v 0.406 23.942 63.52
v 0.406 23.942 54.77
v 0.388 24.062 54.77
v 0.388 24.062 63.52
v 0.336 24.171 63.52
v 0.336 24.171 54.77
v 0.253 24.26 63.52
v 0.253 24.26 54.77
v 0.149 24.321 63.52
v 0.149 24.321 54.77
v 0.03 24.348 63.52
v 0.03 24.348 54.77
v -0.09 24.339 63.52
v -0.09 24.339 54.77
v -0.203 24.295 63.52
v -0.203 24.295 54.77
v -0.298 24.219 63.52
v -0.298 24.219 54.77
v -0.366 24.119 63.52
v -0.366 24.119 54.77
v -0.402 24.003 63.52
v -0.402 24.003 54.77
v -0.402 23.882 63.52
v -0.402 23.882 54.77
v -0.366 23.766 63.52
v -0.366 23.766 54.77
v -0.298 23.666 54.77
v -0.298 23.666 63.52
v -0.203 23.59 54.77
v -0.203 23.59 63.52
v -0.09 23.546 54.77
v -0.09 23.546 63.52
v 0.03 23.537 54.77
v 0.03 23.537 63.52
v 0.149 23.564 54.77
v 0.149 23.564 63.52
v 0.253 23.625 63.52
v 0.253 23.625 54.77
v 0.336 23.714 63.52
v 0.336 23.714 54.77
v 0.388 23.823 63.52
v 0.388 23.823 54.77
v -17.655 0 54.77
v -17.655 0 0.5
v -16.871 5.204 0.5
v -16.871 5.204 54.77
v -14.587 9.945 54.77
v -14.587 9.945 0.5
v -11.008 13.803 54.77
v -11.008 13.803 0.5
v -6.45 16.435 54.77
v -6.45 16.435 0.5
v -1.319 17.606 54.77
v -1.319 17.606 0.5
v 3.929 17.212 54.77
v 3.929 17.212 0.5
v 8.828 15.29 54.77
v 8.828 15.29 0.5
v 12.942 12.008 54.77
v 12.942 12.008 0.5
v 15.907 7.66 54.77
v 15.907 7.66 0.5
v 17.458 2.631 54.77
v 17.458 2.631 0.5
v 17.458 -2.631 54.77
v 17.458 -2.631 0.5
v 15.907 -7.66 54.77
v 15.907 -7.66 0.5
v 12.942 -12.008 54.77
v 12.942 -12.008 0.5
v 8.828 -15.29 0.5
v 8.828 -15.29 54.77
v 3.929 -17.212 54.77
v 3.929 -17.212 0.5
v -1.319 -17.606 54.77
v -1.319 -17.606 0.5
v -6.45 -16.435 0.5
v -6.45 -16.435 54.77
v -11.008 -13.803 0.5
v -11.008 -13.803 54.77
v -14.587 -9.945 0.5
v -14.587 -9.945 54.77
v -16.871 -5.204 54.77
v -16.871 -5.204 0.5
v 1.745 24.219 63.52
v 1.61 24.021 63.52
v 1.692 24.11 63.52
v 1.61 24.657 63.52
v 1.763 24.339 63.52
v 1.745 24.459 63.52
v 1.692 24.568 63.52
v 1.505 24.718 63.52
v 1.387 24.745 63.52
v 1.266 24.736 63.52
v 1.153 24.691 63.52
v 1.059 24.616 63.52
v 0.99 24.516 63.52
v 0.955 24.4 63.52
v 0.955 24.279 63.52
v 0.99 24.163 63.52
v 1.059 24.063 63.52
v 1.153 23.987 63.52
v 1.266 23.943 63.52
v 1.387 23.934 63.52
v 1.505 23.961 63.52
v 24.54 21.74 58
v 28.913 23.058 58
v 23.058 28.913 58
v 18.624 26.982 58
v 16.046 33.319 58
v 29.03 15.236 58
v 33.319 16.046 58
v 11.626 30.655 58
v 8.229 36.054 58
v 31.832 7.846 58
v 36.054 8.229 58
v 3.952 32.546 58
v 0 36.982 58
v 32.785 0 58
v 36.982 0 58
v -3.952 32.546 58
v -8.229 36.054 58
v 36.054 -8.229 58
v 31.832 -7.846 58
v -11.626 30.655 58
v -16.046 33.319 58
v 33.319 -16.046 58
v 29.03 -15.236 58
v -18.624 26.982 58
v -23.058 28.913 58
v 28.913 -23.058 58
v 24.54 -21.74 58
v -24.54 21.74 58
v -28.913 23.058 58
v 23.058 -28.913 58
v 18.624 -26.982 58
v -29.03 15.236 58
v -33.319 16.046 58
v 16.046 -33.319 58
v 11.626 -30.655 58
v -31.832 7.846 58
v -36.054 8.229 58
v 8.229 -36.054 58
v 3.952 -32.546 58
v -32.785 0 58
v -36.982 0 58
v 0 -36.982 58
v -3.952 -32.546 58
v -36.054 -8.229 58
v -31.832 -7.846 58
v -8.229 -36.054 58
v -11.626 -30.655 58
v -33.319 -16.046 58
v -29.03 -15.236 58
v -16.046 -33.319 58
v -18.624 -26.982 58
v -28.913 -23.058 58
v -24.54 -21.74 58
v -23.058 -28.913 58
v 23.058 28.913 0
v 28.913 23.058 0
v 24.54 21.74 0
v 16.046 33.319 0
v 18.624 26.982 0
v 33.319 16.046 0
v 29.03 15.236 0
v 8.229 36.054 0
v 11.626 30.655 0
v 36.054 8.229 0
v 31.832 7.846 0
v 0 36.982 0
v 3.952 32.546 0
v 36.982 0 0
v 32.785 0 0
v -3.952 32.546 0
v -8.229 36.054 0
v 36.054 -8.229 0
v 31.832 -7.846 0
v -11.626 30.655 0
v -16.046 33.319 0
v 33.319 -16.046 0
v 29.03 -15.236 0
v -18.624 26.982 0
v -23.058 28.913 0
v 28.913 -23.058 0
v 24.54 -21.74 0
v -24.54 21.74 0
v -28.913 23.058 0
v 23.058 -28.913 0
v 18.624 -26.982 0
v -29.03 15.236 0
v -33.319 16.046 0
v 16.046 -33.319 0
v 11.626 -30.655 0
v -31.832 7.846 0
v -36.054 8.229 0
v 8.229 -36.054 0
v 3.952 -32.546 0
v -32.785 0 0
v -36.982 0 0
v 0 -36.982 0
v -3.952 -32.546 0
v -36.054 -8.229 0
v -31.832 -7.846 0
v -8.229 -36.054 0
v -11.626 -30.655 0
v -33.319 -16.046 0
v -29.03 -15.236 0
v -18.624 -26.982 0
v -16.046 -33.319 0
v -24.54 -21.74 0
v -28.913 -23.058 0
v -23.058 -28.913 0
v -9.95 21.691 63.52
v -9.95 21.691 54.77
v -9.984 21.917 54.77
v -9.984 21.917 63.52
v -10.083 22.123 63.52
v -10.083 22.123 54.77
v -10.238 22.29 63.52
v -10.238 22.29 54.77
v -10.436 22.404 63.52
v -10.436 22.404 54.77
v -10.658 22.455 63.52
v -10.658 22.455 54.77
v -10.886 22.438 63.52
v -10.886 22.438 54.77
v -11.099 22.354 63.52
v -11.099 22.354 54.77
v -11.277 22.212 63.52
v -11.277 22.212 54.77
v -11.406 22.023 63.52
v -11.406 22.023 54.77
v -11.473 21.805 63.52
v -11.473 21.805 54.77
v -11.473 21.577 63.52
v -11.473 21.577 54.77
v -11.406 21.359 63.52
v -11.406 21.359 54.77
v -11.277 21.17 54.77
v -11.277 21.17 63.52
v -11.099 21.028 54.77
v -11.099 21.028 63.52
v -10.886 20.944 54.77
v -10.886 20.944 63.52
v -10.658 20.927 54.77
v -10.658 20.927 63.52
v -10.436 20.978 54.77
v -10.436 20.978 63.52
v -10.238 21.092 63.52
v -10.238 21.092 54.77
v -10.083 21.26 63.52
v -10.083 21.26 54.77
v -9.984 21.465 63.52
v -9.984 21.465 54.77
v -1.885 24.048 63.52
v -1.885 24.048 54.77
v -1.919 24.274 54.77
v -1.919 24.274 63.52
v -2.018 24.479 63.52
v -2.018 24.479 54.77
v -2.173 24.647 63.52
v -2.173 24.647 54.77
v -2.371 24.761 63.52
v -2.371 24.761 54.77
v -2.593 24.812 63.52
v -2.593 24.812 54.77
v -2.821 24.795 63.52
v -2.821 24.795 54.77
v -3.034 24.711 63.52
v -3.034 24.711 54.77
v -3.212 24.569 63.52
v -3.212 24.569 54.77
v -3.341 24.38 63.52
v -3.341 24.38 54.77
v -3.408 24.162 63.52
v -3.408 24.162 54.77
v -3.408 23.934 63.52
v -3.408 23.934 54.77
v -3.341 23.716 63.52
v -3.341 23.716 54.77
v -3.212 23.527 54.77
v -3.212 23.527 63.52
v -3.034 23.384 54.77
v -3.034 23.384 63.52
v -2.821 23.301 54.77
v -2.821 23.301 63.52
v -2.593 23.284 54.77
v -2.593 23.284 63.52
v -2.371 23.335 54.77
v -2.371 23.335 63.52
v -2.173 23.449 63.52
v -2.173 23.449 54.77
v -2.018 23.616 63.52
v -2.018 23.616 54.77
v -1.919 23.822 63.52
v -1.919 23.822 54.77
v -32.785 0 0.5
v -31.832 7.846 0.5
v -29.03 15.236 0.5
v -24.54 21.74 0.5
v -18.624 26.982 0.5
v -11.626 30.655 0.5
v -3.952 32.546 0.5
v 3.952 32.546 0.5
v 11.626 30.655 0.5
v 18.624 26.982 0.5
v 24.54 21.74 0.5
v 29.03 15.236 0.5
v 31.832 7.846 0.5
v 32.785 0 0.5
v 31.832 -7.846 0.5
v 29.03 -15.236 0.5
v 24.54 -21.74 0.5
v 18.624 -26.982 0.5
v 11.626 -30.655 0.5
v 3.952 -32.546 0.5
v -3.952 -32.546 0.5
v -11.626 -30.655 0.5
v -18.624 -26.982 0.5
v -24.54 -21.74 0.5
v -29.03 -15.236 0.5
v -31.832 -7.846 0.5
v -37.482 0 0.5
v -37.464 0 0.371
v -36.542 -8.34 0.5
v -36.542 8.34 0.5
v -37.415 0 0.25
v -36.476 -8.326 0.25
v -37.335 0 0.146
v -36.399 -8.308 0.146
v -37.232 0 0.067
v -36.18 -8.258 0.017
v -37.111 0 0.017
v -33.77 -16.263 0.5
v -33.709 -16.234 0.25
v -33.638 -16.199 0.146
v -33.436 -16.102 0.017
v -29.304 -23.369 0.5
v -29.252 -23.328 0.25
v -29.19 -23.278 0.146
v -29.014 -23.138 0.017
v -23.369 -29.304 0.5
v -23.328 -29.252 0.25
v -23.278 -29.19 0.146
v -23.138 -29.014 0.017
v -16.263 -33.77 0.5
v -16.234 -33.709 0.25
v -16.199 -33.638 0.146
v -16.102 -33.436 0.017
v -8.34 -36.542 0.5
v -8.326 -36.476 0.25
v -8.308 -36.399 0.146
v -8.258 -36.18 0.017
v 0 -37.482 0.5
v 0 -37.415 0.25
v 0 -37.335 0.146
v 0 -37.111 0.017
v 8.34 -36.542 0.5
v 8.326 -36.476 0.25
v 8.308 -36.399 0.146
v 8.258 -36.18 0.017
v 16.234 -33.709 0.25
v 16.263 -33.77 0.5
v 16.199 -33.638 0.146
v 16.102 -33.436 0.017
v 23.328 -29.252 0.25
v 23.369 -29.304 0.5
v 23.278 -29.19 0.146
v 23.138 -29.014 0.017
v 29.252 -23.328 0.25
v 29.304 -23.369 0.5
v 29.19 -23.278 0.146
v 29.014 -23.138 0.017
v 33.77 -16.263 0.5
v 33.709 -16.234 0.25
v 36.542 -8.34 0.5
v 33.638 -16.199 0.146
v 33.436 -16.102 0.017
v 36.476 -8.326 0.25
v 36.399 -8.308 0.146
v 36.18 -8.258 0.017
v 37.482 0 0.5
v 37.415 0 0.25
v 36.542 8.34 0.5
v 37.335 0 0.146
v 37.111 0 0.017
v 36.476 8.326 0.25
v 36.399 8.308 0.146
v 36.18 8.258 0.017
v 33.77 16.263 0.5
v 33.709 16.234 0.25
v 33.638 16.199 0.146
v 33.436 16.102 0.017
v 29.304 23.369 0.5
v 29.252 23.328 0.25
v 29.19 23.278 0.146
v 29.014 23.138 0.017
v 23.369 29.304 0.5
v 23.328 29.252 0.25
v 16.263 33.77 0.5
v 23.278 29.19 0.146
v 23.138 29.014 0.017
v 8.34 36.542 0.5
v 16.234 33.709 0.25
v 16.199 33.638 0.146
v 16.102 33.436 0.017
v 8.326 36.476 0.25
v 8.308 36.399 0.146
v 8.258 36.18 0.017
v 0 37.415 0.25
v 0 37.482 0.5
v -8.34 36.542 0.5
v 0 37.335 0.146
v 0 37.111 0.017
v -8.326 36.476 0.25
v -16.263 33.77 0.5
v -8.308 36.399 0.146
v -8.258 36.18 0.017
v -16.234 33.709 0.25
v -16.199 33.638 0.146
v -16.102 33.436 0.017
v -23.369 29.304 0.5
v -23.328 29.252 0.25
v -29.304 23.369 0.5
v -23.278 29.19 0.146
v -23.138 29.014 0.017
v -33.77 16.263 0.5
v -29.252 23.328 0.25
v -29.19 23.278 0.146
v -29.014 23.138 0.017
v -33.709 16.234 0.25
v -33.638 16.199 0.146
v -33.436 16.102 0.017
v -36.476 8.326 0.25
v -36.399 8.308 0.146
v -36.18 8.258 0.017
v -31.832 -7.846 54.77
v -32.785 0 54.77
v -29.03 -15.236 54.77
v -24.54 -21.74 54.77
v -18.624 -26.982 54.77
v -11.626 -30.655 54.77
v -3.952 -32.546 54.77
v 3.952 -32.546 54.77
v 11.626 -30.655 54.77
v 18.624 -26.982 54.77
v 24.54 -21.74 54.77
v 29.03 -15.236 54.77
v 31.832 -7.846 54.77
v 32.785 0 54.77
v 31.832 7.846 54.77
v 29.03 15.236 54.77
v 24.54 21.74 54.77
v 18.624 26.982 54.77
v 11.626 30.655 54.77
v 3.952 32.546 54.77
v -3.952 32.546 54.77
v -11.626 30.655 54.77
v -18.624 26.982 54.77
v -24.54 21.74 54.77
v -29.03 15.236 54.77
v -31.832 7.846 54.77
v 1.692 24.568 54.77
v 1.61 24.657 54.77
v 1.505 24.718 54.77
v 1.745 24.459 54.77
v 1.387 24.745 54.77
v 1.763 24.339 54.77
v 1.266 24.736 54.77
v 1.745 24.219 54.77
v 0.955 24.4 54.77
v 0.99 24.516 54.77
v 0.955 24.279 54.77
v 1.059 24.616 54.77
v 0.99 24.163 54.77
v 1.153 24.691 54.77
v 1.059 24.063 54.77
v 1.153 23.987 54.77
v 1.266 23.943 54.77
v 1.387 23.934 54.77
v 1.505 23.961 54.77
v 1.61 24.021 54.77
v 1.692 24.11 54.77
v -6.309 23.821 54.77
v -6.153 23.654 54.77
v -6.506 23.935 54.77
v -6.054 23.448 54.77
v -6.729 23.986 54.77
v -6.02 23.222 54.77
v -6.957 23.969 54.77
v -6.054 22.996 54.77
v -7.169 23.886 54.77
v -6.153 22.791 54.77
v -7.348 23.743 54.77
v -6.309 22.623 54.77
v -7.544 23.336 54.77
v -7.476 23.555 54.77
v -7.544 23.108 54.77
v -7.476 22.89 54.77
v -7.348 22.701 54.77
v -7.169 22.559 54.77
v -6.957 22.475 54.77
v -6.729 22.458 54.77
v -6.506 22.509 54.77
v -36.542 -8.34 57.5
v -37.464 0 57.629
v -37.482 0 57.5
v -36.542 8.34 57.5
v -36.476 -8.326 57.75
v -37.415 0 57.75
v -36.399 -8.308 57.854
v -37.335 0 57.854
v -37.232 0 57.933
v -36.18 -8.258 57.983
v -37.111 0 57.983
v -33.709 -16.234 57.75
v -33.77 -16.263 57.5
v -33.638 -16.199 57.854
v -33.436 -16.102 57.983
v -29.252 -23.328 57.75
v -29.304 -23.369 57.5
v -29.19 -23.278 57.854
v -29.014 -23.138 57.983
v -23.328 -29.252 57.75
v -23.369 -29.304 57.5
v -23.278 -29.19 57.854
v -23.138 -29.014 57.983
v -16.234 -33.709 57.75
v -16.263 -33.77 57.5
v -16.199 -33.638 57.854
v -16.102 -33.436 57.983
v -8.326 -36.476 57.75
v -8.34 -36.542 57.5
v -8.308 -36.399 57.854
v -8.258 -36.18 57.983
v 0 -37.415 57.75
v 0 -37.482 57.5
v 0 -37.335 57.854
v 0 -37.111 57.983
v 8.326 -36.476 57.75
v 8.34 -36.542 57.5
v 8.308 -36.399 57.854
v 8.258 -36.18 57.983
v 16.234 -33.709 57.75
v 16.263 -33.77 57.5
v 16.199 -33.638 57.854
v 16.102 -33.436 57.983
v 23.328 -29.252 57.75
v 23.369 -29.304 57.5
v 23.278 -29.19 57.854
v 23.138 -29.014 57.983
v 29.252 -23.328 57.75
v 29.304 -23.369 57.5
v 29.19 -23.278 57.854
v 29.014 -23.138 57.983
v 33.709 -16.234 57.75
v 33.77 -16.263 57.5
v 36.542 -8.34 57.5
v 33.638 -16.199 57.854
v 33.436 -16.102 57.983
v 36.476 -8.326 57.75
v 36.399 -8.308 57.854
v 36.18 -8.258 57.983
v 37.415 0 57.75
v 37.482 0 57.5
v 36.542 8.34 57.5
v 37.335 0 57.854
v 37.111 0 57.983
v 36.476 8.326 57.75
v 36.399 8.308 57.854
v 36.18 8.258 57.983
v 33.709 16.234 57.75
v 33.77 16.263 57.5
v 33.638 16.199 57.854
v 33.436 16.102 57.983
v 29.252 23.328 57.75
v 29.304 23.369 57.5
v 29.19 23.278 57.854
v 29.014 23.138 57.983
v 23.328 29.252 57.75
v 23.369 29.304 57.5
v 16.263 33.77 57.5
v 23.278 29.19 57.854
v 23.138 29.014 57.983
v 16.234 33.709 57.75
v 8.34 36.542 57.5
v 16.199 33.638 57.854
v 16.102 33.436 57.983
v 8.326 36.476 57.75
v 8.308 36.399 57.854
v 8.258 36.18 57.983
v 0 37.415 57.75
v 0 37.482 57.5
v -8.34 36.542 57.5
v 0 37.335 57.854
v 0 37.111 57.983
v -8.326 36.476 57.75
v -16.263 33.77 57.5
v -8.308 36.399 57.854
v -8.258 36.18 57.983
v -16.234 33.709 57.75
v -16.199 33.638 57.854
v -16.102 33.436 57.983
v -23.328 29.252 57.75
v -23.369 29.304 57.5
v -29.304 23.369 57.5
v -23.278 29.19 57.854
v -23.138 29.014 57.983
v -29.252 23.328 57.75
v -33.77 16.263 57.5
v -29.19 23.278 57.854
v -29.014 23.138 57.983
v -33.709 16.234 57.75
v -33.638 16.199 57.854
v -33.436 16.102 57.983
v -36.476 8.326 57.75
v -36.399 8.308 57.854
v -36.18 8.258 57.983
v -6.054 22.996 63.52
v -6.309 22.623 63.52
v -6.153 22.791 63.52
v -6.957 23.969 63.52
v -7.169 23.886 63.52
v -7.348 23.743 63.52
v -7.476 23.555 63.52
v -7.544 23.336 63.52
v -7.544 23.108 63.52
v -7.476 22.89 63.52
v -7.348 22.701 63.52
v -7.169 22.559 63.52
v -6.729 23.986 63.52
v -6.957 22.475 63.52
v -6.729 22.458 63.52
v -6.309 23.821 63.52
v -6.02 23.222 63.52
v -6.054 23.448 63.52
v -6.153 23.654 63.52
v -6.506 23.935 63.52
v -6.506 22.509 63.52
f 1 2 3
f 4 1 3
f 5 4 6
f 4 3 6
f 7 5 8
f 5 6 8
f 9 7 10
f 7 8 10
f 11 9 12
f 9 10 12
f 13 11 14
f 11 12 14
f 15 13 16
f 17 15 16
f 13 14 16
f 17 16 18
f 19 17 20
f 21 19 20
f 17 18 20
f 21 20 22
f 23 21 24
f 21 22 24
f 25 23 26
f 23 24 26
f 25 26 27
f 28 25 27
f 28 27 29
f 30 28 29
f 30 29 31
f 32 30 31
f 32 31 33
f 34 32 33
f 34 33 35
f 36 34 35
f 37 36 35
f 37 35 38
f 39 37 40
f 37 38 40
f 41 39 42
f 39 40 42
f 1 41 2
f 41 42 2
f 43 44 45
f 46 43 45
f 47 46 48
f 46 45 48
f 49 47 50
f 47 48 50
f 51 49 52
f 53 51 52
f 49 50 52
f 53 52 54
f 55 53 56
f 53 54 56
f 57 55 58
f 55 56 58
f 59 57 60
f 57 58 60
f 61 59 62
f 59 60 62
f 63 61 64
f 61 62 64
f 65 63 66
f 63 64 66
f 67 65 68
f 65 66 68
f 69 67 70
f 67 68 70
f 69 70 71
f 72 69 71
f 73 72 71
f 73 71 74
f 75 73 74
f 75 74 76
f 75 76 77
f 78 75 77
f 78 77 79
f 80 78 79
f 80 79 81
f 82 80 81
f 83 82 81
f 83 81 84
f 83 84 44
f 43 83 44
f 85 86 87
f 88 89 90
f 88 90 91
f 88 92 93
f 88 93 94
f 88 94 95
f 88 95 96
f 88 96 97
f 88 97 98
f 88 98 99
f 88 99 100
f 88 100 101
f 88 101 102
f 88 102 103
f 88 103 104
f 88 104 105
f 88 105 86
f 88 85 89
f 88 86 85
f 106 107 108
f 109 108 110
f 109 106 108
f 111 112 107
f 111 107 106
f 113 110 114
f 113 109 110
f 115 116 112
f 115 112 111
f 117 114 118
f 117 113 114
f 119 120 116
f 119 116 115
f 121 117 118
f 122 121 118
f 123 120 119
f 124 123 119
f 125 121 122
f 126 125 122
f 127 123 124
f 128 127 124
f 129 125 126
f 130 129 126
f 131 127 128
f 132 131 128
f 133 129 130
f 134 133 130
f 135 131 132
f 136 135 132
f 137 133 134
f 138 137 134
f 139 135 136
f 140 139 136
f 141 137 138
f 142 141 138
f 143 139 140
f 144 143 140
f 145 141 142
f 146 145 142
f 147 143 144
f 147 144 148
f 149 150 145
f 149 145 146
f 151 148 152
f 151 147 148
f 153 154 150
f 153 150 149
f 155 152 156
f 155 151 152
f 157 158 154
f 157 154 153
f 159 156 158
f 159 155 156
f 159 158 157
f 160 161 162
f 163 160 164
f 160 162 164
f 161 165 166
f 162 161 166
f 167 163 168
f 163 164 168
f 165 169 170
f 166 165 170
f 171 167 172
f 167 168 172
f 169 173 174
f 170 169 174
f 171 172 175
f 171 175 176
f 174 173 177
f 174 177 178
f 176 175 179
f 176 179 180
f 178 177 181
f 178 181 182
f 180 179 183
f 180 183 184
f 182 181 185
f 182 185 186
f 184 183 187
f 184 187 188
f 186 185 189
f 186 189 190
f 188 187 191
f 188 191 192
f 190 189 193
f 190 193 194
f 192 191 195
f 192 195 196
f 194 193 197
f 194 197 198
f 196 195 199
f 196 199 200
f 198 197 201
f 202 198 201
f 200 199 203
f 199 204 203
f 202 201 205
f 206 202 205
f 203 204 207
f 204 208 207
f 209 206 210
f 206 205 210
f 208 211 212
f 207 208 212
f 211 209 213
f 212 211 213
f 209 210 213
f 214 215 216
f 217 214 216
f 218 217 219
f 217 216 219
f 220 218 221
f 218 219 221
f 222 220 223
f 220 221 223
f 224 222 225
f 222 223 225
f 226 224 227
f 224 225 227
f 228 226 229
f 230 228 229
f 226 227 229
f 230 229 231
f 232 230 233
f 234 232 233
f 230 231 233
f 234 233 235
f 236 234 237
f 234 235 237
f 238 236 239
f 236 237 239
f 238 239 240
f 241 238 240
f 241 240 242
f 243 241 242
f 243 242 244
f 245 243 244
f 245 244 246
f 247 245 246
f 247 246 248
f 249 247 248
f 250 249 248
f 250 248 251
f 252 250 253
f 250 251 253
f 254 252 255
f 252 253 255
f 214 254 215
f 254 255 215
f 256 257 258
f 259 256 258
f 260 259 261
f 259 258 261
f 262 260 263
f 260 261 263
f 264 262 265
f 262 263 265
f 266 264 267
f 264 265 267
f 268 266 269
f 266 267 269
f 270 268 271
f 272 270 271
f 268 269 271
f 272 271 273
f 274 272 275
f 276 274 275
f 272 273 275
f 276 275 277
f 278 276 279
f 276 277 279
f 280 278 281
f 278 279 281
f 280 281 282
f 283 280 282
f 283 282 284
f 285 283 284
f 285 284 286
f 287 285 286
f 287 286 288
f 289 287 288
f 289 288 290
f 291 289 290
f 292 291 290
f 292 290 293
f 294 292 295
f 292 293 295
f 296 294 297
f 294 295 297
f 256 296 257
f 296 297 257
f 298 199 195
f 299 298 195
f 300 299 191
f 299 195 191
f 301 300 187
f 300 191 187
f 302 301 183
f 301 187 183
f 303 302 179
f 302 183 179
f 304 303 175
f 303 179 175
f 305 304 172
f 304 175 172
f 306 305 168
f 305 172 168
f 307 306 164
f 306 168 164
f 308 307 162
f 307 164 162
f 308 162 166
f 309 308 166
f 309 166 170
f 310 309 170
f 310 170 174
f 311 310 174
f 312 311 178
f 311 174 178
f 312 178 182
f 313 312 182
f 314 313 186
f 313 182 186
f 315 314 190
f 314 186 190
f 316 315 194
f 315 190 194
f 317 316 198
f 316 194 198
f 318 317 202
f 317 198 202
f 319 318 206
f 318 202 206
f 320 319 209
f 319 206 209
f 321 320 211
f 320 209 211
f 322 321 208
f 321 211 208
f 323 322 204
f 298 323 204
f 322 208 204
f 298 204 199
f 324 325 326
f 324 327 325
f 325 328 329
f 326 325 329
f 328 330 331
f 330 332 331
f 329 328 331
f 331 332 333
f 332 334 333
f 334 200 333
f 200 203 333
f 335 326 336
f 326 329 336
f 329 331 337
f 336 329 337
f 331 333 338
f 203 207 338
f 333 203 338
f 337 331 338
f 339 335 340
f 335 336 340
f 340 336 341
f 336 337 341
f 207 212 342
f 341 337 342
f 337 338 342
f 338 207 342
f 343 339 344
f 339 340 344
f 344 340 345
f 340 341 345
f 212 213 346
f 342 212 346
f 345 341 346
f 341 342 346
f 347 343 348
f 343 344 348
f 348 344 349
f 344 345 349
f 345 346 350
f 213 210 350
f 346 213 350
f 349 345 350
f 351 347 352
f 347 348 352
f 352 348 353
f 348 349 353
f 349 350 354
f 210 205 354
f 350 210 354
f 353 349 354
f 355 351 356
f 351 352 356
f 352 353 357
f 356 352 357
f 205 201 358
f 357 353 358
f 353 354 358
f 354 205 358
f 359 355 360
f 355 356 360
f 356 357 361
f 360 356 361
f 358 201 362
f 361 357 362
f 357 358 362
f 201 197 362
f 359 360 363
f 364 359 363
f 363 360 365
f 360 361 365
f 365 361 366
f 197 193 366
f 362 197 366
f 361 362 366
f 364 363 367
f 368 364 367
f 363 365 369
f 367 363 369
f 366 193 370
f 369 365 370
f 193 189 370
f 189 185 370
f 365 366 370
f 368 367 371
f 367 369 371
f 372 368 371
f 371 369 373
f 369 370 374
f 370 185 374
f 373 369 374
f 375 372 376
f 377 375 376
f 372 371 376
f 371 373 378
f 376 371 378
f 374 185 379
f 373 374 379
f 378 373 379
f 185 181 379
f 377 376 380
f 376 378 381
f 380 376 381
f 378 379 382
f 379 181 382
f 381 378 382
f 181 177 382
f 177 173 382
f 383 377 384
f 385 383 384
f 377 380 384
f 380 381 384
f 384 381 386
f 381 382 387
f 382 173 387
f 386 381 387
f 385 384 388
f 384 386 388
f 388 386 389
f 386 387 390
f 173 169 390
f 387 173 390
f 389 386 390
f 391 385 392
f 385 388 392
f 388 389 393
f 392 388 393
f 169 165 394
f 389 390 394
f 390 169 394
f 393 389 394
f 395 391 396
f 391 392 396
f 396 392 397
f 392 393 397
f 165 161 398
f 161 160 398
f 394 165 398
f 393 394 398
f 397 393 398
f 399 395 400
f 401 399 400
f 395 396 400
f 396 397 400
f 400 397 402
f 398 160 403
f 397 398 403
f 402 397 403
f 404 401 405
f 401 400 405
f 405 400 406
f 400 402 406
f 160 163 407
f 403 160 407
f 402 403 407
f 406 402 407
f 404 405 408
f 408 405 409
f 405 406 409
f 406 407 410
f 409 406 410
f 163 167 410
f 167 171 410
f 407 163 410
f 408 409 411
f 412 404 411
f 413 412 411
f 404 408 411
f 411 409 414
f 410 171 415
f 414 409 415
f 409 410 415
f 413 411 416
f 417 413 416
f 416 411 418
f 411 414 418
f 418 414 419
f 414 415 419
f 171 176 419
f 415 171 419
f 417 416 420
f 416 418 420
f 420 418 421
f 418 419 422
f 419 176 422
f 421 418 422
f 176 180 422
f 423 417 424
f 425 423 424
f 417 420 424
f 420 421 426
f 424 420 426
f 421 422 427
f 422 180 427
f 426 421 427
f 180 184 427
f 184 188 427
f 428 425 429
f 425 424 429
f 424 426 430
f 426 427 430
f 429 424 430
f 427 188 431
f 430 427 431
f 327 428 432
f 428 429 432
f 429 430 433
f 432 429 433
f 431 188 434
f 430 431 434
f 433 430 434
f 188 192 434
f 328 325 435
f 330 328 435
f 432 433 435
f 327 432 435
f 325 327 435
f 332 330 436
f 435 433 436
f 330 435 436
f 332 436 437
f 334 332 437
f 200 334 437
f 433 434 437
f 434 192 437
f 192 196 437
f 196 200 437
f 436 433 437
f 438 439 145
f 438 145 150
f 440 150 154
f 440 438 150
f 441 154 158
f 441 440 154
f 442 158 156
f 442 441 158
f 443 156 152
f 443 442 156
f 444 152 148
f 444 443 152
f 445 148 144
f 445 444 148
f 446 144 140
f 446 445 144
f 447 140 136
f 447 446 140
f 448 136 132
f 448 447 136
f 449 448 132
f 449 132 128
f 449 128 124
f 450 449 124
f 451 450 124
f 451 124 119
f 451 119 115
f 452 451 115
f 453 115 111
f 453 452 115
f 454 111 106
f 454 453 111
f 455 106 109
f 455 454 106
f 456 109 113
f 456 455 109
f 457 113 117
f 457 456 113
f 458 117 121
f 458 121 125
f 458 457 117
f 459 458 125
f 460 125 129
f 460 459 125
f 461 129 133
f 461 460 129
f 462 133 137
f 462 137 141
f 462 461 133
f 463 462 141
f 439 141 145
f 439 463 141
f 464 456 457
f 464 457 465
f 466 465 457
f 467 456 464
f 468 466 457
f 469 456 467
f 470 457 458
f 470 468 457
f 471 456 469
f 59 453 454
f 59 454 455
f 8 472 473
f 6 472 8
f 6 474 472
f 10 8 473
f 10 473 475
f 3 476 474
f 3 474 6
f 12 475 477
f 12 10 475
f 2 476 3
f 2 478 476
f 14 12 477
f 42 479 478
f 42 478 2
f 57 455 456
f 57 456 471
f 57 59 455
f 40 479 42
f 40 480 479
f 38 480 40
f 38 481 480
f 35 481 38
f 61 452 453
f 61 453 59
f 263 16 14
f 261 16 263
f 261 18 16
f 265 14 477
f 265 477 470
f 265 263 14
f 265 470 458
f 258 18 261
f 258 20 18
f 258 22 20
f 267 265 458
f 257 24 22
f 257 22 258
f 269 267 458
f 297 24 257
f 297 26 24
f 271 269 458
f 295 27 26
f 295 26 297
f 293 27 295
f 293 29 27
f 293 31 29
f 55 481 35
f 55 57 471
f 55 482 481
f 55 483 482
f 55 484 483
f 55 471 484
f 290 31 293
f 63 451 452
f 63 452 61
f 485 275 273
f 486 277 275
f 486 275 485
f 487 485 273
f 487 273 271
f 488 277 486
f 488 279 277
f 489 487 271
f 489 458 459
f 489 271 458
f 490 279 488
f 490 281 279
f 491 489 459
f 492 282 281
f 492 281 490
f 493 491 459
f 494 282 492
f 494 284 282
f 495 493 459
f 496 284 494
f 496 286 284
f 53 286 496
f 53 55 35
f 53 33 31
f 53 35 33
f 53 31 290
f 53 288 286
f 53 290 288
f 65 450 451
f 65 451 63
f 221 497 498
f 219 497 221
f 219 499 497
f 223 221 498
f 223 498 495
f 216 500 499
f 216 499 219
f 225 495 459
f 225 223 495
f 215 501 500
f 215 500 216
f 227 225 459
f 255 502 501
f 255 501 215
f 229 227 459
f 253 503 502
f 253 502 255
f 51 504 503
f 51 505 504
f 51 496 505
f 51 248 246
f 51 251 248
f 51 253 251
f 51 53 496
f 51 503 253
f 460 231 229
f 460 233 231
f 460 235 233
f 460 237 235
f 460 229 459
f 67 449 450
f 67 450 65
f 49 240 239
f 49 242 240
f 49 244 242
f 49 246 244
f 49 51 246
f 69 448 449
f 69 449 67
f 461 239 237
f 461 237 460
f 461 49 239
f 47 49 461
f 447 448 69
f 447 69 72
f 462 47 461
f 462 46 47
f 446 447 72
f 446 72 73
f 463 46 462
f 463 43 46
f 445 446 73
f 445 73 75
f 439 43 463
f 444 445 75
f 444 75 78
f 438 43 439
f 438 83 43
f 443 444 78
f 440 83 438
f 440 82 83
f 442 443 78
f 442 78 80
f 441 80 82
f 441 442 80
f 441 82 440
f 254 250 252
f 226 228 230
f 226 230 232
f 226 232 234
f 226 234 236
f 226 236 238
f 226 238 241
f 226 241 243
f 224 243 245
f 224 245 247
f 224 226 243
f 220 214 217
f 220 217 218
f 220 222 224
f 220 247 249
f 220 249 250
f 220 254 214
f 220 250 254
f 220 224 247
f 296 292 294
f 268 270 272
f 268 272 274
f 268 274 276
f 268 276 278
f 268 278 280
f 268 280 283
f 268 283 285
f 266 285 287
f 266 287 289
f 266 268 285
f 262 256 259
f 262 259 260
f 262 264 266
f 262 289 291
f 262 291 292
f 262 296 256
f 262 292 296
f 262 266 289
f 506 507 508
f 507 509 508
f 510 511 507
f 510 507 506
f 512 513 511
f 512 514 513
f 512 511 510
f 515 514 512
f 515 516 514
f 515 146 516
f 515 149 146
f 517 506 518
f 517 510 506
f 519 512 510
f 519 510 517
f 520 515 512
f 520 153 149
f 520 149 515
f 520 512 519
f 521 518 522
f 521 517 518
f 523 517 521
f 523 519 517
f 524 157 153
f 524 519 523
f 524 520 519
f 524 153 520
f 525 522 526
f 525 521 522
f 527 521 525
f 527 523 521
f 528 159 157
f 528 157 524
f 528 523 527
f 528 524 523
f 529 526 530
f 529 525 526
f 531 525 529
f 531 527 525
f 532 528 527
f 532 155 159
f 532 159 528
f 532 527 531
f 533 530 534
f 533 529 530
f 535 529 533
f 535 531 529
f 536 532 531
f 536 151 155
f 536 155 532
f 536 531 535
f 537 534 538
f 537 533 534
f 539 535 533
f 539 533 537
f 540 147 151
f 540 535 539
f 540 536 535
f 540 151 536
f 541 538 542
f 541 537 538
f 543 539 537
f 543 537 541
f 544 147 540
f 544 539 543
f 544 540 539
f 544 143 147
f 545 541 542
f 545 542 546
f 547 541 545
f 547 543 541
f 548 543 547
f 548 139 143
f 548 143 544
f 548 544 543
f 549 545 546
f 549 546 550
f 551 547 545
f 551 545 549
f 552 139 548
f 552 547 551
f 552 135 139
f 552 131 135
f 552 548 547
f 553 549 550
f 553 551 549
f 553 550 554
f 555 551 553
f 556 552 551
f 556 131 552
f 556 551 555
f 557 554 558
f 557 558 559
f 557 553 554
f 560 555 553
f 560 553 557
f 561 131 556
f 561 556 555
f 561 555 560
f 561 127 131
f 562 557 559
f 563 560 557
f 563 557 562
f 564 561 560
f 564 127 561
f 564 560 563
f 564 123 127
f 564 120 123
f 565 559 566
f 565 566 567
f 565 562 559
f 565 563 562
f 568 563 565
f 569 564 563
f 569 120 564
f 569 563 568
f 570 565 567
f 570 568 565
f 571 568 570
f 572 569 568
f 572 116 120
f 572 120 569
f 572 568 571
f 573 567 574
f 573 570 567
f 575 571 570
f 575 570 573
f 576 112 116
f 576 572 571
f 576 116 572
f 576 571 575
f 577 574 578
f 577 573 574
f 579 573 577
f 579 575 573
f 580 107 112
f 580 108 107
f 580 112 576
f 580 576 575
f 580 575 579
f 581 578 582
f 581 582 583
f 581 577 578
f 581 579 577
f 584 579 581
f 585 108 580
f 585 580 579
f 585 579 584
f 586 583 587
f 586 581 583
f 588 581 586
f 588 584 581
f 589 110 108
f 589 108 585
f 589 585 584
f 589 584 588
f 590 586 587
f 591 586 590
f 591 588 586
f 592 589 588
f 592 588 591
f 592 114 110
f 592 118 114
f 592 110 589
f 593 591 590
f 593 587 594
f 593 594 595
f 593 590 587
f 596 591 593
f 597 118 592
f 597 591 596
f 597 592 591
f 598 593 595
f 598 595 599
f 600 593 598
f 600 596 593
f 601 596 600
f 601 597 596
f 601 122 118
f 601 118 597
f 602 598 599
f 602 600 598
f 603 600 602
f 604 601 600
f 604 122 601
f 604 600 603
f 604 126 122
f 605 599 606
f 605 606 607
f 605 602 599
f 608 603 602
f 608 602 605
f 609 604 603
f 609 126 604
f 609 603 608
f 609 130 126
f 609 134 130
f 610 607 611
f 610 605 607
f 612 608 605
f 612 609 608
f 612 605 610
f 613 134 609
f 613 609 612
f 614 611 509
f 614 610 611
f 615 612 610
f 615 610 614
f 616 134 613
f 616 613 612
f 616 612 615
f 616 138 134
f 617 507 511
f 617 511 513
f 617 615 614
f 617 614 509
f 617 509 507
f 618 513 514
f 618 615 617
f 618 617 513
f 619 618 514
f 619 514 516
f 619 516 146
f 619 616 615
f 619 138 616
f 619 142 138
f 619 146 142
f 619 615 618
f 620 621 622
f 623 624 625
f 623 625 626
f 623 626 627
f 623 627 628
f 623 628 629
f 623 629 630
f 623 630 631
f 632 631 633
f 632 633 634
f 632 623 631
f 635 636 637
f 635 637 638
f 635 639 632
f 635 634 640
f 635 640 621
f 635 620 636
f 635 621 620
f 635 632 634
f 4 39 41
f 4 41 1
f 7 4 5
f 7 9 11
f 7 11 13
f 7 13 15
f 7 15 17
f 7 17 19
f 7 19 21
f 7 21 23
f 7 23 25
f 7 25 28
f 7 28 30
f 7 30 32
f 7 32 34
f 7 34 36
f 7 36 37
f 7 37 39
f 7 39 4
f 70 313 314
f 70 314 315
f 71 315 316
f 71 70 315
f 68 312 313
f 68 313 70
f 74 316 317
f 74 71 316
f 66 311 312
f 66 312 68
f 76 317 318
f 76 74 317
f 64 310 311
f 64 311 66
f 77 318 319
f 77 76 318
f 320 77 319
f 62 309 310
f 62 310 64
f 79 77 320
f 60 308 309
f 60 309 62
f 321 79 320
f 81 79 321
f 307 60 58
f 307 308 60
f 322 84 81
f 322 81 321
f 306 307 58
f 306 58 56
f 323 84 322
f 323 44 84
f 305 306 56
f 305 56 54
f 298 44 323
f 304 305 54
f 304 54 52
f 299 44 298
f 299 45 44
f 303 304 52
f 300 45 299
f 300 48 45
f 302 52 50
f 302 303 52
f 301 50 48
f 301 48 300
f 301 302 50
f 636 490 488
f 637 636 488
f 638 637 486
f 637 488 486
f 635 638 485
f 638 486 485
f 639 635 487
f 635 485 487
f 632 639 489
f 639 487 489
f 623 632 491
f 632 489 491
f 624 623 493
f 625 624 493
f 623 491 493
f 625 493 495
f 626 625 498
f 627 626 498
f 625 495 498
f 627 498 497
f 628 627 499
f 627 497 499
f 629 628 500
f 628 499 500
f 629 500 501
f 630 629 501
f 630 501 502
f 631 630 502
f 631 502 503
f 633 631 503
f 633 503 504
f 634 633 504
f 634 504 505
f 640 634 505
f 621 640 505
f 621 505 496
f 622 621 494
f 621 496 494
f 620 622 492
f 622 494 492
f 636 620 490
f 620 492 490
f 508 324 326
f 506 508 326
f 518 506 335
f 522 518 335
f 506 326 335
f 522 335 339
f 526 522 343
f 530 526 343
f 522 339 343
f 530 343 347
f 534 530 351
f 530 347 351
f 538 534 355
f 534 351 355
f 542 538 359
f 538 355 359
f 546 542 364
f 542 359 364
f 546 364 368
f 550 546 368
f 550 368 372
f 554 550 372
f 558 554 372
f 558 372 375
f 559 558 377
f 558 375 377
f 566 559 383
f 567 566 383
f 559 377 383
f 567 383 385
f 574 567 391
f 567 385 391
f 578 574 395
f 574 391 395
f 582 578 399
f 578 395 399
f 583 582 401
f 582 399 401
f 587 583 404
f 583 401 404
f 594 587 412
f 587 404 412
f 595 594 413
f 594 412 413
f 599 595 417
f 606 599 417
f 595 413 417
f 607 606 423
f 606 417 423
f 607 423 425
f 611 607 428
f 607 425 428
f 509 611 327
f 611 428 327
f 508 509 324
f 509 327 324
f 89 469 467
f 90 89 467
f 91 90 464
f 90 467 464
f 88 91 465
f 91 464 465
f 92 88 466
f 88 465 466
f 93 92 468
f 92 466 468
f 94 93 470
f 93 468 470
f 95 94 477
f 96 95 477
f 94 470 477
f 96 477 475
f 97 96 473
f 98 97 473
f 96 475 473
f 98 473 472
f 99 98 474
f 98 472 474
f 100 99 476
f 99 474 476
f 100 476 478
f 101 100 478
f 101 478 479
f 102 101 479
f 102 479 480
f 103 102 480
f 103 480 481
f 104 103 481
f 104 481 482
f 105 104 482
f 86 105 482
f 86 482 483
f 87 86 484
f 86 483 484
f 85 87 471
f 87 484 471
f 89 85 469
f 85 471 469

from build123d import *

# Parameters (mm, degrees)
SKETCH_1_R          = 37.4815
EXTRUDE_1_DEPTH     = 58
SKETCH_2_R          = 32.785
CUT_EXTRUDE_1_DEPTH = 0.5
CUT_EXTRUDE_START   = -3.23
SKETCH_3_R          = 32.785
CUT_EXTRUDE_2_DEPTH = 3.23
SKETCH_4_R          = 17.655
CUT_EXTRUDE_3_DEPTH = 79.204703724
SKETCH_5_R          = 0.766
SKETCH_5_R_2        = 0.4065
EXTRUDE_2_DEPTH     = 8.75
FILLET_1_R          = 0.5


with BuildPart() as part:
    # 草图1 → 凸台-拉伸1 (new body)
    with BuildSketch(Plane.XY):
        with Locations(Location((0, 0, 0), (0, 0, 180))):
            Circle(SKETCH_1_R)
    extrude(amount=EXTRUDE_1_DEPTH)

    # 草图2 → 切除-拉伸1 (cut)
    with BuildSketch(Plane(origin=(0, 0, 0), x_dir=(-1, 0, 0), z_dir=(0, 0, -1))):
        Circle(SKETCH_2_R)
    extrude(amount=-CUT_EXTRUDE_1_DEPTH, mode=Mode.SUBTRACT)

    # 草图3 → 切除-拉伸2 (cut)
    with BuildSketch(Plane.XY.offset(58).offset(CUT_EXTRUDE_START)):
        with Locations(Location((0, 0, 0), (0, 0, 180))):
            Circle(SKETCH_3_R)
    extrude(amount=CUT_EXTRUDE_2_DEPTH, mode=Mode.SUBTRACT)

    # 草图4 → 切除-拉伸3 (cut, through all)
    with BuildSketch(Plane(origin=(0, 0, 0.5), x_dir=(-1, 0, 0), z_dir=(0, 0, -1))):
        Circle(SKETCH_4_R)
    extrude(amount=-CUT_EXTRUDE_3_DEPTH, mode=Mode.SUBTRACT)

    # 草图5 → 凸台-拉伸2 (add)
    with BuildSketch(Plane.XY.offset(54.77)):
        with Locations((-10.715657222, 21.691015019)):
            Circle(SKETCH_5_R)
        with Locations((-6.786257081, 23.22223411)):
            Circle(SKETCH_5_R)
        with Locations((-2.650659953, 24.04785737)):
            Circle(SKETCH_5_R)
        with Locations((0, 23.9425)):
            Circle(SKETCH_5_R_2)
        with Locations((1.356512851, 24.339227635)):
            Circle(SKETCH_5_R_2)
    extrude(amount=EXTRUDE_2_DEPTH)

    # 圆角1
    fillet_1_edges = [part.edges().sort_by_distance(p)[0] for p in [
        (37.4815, 0, 0),
        (37.4815, 0, 58),
    ]]
    fillet(fillet_1_edges, radius=FILLET_1_R)


solid = part.part
